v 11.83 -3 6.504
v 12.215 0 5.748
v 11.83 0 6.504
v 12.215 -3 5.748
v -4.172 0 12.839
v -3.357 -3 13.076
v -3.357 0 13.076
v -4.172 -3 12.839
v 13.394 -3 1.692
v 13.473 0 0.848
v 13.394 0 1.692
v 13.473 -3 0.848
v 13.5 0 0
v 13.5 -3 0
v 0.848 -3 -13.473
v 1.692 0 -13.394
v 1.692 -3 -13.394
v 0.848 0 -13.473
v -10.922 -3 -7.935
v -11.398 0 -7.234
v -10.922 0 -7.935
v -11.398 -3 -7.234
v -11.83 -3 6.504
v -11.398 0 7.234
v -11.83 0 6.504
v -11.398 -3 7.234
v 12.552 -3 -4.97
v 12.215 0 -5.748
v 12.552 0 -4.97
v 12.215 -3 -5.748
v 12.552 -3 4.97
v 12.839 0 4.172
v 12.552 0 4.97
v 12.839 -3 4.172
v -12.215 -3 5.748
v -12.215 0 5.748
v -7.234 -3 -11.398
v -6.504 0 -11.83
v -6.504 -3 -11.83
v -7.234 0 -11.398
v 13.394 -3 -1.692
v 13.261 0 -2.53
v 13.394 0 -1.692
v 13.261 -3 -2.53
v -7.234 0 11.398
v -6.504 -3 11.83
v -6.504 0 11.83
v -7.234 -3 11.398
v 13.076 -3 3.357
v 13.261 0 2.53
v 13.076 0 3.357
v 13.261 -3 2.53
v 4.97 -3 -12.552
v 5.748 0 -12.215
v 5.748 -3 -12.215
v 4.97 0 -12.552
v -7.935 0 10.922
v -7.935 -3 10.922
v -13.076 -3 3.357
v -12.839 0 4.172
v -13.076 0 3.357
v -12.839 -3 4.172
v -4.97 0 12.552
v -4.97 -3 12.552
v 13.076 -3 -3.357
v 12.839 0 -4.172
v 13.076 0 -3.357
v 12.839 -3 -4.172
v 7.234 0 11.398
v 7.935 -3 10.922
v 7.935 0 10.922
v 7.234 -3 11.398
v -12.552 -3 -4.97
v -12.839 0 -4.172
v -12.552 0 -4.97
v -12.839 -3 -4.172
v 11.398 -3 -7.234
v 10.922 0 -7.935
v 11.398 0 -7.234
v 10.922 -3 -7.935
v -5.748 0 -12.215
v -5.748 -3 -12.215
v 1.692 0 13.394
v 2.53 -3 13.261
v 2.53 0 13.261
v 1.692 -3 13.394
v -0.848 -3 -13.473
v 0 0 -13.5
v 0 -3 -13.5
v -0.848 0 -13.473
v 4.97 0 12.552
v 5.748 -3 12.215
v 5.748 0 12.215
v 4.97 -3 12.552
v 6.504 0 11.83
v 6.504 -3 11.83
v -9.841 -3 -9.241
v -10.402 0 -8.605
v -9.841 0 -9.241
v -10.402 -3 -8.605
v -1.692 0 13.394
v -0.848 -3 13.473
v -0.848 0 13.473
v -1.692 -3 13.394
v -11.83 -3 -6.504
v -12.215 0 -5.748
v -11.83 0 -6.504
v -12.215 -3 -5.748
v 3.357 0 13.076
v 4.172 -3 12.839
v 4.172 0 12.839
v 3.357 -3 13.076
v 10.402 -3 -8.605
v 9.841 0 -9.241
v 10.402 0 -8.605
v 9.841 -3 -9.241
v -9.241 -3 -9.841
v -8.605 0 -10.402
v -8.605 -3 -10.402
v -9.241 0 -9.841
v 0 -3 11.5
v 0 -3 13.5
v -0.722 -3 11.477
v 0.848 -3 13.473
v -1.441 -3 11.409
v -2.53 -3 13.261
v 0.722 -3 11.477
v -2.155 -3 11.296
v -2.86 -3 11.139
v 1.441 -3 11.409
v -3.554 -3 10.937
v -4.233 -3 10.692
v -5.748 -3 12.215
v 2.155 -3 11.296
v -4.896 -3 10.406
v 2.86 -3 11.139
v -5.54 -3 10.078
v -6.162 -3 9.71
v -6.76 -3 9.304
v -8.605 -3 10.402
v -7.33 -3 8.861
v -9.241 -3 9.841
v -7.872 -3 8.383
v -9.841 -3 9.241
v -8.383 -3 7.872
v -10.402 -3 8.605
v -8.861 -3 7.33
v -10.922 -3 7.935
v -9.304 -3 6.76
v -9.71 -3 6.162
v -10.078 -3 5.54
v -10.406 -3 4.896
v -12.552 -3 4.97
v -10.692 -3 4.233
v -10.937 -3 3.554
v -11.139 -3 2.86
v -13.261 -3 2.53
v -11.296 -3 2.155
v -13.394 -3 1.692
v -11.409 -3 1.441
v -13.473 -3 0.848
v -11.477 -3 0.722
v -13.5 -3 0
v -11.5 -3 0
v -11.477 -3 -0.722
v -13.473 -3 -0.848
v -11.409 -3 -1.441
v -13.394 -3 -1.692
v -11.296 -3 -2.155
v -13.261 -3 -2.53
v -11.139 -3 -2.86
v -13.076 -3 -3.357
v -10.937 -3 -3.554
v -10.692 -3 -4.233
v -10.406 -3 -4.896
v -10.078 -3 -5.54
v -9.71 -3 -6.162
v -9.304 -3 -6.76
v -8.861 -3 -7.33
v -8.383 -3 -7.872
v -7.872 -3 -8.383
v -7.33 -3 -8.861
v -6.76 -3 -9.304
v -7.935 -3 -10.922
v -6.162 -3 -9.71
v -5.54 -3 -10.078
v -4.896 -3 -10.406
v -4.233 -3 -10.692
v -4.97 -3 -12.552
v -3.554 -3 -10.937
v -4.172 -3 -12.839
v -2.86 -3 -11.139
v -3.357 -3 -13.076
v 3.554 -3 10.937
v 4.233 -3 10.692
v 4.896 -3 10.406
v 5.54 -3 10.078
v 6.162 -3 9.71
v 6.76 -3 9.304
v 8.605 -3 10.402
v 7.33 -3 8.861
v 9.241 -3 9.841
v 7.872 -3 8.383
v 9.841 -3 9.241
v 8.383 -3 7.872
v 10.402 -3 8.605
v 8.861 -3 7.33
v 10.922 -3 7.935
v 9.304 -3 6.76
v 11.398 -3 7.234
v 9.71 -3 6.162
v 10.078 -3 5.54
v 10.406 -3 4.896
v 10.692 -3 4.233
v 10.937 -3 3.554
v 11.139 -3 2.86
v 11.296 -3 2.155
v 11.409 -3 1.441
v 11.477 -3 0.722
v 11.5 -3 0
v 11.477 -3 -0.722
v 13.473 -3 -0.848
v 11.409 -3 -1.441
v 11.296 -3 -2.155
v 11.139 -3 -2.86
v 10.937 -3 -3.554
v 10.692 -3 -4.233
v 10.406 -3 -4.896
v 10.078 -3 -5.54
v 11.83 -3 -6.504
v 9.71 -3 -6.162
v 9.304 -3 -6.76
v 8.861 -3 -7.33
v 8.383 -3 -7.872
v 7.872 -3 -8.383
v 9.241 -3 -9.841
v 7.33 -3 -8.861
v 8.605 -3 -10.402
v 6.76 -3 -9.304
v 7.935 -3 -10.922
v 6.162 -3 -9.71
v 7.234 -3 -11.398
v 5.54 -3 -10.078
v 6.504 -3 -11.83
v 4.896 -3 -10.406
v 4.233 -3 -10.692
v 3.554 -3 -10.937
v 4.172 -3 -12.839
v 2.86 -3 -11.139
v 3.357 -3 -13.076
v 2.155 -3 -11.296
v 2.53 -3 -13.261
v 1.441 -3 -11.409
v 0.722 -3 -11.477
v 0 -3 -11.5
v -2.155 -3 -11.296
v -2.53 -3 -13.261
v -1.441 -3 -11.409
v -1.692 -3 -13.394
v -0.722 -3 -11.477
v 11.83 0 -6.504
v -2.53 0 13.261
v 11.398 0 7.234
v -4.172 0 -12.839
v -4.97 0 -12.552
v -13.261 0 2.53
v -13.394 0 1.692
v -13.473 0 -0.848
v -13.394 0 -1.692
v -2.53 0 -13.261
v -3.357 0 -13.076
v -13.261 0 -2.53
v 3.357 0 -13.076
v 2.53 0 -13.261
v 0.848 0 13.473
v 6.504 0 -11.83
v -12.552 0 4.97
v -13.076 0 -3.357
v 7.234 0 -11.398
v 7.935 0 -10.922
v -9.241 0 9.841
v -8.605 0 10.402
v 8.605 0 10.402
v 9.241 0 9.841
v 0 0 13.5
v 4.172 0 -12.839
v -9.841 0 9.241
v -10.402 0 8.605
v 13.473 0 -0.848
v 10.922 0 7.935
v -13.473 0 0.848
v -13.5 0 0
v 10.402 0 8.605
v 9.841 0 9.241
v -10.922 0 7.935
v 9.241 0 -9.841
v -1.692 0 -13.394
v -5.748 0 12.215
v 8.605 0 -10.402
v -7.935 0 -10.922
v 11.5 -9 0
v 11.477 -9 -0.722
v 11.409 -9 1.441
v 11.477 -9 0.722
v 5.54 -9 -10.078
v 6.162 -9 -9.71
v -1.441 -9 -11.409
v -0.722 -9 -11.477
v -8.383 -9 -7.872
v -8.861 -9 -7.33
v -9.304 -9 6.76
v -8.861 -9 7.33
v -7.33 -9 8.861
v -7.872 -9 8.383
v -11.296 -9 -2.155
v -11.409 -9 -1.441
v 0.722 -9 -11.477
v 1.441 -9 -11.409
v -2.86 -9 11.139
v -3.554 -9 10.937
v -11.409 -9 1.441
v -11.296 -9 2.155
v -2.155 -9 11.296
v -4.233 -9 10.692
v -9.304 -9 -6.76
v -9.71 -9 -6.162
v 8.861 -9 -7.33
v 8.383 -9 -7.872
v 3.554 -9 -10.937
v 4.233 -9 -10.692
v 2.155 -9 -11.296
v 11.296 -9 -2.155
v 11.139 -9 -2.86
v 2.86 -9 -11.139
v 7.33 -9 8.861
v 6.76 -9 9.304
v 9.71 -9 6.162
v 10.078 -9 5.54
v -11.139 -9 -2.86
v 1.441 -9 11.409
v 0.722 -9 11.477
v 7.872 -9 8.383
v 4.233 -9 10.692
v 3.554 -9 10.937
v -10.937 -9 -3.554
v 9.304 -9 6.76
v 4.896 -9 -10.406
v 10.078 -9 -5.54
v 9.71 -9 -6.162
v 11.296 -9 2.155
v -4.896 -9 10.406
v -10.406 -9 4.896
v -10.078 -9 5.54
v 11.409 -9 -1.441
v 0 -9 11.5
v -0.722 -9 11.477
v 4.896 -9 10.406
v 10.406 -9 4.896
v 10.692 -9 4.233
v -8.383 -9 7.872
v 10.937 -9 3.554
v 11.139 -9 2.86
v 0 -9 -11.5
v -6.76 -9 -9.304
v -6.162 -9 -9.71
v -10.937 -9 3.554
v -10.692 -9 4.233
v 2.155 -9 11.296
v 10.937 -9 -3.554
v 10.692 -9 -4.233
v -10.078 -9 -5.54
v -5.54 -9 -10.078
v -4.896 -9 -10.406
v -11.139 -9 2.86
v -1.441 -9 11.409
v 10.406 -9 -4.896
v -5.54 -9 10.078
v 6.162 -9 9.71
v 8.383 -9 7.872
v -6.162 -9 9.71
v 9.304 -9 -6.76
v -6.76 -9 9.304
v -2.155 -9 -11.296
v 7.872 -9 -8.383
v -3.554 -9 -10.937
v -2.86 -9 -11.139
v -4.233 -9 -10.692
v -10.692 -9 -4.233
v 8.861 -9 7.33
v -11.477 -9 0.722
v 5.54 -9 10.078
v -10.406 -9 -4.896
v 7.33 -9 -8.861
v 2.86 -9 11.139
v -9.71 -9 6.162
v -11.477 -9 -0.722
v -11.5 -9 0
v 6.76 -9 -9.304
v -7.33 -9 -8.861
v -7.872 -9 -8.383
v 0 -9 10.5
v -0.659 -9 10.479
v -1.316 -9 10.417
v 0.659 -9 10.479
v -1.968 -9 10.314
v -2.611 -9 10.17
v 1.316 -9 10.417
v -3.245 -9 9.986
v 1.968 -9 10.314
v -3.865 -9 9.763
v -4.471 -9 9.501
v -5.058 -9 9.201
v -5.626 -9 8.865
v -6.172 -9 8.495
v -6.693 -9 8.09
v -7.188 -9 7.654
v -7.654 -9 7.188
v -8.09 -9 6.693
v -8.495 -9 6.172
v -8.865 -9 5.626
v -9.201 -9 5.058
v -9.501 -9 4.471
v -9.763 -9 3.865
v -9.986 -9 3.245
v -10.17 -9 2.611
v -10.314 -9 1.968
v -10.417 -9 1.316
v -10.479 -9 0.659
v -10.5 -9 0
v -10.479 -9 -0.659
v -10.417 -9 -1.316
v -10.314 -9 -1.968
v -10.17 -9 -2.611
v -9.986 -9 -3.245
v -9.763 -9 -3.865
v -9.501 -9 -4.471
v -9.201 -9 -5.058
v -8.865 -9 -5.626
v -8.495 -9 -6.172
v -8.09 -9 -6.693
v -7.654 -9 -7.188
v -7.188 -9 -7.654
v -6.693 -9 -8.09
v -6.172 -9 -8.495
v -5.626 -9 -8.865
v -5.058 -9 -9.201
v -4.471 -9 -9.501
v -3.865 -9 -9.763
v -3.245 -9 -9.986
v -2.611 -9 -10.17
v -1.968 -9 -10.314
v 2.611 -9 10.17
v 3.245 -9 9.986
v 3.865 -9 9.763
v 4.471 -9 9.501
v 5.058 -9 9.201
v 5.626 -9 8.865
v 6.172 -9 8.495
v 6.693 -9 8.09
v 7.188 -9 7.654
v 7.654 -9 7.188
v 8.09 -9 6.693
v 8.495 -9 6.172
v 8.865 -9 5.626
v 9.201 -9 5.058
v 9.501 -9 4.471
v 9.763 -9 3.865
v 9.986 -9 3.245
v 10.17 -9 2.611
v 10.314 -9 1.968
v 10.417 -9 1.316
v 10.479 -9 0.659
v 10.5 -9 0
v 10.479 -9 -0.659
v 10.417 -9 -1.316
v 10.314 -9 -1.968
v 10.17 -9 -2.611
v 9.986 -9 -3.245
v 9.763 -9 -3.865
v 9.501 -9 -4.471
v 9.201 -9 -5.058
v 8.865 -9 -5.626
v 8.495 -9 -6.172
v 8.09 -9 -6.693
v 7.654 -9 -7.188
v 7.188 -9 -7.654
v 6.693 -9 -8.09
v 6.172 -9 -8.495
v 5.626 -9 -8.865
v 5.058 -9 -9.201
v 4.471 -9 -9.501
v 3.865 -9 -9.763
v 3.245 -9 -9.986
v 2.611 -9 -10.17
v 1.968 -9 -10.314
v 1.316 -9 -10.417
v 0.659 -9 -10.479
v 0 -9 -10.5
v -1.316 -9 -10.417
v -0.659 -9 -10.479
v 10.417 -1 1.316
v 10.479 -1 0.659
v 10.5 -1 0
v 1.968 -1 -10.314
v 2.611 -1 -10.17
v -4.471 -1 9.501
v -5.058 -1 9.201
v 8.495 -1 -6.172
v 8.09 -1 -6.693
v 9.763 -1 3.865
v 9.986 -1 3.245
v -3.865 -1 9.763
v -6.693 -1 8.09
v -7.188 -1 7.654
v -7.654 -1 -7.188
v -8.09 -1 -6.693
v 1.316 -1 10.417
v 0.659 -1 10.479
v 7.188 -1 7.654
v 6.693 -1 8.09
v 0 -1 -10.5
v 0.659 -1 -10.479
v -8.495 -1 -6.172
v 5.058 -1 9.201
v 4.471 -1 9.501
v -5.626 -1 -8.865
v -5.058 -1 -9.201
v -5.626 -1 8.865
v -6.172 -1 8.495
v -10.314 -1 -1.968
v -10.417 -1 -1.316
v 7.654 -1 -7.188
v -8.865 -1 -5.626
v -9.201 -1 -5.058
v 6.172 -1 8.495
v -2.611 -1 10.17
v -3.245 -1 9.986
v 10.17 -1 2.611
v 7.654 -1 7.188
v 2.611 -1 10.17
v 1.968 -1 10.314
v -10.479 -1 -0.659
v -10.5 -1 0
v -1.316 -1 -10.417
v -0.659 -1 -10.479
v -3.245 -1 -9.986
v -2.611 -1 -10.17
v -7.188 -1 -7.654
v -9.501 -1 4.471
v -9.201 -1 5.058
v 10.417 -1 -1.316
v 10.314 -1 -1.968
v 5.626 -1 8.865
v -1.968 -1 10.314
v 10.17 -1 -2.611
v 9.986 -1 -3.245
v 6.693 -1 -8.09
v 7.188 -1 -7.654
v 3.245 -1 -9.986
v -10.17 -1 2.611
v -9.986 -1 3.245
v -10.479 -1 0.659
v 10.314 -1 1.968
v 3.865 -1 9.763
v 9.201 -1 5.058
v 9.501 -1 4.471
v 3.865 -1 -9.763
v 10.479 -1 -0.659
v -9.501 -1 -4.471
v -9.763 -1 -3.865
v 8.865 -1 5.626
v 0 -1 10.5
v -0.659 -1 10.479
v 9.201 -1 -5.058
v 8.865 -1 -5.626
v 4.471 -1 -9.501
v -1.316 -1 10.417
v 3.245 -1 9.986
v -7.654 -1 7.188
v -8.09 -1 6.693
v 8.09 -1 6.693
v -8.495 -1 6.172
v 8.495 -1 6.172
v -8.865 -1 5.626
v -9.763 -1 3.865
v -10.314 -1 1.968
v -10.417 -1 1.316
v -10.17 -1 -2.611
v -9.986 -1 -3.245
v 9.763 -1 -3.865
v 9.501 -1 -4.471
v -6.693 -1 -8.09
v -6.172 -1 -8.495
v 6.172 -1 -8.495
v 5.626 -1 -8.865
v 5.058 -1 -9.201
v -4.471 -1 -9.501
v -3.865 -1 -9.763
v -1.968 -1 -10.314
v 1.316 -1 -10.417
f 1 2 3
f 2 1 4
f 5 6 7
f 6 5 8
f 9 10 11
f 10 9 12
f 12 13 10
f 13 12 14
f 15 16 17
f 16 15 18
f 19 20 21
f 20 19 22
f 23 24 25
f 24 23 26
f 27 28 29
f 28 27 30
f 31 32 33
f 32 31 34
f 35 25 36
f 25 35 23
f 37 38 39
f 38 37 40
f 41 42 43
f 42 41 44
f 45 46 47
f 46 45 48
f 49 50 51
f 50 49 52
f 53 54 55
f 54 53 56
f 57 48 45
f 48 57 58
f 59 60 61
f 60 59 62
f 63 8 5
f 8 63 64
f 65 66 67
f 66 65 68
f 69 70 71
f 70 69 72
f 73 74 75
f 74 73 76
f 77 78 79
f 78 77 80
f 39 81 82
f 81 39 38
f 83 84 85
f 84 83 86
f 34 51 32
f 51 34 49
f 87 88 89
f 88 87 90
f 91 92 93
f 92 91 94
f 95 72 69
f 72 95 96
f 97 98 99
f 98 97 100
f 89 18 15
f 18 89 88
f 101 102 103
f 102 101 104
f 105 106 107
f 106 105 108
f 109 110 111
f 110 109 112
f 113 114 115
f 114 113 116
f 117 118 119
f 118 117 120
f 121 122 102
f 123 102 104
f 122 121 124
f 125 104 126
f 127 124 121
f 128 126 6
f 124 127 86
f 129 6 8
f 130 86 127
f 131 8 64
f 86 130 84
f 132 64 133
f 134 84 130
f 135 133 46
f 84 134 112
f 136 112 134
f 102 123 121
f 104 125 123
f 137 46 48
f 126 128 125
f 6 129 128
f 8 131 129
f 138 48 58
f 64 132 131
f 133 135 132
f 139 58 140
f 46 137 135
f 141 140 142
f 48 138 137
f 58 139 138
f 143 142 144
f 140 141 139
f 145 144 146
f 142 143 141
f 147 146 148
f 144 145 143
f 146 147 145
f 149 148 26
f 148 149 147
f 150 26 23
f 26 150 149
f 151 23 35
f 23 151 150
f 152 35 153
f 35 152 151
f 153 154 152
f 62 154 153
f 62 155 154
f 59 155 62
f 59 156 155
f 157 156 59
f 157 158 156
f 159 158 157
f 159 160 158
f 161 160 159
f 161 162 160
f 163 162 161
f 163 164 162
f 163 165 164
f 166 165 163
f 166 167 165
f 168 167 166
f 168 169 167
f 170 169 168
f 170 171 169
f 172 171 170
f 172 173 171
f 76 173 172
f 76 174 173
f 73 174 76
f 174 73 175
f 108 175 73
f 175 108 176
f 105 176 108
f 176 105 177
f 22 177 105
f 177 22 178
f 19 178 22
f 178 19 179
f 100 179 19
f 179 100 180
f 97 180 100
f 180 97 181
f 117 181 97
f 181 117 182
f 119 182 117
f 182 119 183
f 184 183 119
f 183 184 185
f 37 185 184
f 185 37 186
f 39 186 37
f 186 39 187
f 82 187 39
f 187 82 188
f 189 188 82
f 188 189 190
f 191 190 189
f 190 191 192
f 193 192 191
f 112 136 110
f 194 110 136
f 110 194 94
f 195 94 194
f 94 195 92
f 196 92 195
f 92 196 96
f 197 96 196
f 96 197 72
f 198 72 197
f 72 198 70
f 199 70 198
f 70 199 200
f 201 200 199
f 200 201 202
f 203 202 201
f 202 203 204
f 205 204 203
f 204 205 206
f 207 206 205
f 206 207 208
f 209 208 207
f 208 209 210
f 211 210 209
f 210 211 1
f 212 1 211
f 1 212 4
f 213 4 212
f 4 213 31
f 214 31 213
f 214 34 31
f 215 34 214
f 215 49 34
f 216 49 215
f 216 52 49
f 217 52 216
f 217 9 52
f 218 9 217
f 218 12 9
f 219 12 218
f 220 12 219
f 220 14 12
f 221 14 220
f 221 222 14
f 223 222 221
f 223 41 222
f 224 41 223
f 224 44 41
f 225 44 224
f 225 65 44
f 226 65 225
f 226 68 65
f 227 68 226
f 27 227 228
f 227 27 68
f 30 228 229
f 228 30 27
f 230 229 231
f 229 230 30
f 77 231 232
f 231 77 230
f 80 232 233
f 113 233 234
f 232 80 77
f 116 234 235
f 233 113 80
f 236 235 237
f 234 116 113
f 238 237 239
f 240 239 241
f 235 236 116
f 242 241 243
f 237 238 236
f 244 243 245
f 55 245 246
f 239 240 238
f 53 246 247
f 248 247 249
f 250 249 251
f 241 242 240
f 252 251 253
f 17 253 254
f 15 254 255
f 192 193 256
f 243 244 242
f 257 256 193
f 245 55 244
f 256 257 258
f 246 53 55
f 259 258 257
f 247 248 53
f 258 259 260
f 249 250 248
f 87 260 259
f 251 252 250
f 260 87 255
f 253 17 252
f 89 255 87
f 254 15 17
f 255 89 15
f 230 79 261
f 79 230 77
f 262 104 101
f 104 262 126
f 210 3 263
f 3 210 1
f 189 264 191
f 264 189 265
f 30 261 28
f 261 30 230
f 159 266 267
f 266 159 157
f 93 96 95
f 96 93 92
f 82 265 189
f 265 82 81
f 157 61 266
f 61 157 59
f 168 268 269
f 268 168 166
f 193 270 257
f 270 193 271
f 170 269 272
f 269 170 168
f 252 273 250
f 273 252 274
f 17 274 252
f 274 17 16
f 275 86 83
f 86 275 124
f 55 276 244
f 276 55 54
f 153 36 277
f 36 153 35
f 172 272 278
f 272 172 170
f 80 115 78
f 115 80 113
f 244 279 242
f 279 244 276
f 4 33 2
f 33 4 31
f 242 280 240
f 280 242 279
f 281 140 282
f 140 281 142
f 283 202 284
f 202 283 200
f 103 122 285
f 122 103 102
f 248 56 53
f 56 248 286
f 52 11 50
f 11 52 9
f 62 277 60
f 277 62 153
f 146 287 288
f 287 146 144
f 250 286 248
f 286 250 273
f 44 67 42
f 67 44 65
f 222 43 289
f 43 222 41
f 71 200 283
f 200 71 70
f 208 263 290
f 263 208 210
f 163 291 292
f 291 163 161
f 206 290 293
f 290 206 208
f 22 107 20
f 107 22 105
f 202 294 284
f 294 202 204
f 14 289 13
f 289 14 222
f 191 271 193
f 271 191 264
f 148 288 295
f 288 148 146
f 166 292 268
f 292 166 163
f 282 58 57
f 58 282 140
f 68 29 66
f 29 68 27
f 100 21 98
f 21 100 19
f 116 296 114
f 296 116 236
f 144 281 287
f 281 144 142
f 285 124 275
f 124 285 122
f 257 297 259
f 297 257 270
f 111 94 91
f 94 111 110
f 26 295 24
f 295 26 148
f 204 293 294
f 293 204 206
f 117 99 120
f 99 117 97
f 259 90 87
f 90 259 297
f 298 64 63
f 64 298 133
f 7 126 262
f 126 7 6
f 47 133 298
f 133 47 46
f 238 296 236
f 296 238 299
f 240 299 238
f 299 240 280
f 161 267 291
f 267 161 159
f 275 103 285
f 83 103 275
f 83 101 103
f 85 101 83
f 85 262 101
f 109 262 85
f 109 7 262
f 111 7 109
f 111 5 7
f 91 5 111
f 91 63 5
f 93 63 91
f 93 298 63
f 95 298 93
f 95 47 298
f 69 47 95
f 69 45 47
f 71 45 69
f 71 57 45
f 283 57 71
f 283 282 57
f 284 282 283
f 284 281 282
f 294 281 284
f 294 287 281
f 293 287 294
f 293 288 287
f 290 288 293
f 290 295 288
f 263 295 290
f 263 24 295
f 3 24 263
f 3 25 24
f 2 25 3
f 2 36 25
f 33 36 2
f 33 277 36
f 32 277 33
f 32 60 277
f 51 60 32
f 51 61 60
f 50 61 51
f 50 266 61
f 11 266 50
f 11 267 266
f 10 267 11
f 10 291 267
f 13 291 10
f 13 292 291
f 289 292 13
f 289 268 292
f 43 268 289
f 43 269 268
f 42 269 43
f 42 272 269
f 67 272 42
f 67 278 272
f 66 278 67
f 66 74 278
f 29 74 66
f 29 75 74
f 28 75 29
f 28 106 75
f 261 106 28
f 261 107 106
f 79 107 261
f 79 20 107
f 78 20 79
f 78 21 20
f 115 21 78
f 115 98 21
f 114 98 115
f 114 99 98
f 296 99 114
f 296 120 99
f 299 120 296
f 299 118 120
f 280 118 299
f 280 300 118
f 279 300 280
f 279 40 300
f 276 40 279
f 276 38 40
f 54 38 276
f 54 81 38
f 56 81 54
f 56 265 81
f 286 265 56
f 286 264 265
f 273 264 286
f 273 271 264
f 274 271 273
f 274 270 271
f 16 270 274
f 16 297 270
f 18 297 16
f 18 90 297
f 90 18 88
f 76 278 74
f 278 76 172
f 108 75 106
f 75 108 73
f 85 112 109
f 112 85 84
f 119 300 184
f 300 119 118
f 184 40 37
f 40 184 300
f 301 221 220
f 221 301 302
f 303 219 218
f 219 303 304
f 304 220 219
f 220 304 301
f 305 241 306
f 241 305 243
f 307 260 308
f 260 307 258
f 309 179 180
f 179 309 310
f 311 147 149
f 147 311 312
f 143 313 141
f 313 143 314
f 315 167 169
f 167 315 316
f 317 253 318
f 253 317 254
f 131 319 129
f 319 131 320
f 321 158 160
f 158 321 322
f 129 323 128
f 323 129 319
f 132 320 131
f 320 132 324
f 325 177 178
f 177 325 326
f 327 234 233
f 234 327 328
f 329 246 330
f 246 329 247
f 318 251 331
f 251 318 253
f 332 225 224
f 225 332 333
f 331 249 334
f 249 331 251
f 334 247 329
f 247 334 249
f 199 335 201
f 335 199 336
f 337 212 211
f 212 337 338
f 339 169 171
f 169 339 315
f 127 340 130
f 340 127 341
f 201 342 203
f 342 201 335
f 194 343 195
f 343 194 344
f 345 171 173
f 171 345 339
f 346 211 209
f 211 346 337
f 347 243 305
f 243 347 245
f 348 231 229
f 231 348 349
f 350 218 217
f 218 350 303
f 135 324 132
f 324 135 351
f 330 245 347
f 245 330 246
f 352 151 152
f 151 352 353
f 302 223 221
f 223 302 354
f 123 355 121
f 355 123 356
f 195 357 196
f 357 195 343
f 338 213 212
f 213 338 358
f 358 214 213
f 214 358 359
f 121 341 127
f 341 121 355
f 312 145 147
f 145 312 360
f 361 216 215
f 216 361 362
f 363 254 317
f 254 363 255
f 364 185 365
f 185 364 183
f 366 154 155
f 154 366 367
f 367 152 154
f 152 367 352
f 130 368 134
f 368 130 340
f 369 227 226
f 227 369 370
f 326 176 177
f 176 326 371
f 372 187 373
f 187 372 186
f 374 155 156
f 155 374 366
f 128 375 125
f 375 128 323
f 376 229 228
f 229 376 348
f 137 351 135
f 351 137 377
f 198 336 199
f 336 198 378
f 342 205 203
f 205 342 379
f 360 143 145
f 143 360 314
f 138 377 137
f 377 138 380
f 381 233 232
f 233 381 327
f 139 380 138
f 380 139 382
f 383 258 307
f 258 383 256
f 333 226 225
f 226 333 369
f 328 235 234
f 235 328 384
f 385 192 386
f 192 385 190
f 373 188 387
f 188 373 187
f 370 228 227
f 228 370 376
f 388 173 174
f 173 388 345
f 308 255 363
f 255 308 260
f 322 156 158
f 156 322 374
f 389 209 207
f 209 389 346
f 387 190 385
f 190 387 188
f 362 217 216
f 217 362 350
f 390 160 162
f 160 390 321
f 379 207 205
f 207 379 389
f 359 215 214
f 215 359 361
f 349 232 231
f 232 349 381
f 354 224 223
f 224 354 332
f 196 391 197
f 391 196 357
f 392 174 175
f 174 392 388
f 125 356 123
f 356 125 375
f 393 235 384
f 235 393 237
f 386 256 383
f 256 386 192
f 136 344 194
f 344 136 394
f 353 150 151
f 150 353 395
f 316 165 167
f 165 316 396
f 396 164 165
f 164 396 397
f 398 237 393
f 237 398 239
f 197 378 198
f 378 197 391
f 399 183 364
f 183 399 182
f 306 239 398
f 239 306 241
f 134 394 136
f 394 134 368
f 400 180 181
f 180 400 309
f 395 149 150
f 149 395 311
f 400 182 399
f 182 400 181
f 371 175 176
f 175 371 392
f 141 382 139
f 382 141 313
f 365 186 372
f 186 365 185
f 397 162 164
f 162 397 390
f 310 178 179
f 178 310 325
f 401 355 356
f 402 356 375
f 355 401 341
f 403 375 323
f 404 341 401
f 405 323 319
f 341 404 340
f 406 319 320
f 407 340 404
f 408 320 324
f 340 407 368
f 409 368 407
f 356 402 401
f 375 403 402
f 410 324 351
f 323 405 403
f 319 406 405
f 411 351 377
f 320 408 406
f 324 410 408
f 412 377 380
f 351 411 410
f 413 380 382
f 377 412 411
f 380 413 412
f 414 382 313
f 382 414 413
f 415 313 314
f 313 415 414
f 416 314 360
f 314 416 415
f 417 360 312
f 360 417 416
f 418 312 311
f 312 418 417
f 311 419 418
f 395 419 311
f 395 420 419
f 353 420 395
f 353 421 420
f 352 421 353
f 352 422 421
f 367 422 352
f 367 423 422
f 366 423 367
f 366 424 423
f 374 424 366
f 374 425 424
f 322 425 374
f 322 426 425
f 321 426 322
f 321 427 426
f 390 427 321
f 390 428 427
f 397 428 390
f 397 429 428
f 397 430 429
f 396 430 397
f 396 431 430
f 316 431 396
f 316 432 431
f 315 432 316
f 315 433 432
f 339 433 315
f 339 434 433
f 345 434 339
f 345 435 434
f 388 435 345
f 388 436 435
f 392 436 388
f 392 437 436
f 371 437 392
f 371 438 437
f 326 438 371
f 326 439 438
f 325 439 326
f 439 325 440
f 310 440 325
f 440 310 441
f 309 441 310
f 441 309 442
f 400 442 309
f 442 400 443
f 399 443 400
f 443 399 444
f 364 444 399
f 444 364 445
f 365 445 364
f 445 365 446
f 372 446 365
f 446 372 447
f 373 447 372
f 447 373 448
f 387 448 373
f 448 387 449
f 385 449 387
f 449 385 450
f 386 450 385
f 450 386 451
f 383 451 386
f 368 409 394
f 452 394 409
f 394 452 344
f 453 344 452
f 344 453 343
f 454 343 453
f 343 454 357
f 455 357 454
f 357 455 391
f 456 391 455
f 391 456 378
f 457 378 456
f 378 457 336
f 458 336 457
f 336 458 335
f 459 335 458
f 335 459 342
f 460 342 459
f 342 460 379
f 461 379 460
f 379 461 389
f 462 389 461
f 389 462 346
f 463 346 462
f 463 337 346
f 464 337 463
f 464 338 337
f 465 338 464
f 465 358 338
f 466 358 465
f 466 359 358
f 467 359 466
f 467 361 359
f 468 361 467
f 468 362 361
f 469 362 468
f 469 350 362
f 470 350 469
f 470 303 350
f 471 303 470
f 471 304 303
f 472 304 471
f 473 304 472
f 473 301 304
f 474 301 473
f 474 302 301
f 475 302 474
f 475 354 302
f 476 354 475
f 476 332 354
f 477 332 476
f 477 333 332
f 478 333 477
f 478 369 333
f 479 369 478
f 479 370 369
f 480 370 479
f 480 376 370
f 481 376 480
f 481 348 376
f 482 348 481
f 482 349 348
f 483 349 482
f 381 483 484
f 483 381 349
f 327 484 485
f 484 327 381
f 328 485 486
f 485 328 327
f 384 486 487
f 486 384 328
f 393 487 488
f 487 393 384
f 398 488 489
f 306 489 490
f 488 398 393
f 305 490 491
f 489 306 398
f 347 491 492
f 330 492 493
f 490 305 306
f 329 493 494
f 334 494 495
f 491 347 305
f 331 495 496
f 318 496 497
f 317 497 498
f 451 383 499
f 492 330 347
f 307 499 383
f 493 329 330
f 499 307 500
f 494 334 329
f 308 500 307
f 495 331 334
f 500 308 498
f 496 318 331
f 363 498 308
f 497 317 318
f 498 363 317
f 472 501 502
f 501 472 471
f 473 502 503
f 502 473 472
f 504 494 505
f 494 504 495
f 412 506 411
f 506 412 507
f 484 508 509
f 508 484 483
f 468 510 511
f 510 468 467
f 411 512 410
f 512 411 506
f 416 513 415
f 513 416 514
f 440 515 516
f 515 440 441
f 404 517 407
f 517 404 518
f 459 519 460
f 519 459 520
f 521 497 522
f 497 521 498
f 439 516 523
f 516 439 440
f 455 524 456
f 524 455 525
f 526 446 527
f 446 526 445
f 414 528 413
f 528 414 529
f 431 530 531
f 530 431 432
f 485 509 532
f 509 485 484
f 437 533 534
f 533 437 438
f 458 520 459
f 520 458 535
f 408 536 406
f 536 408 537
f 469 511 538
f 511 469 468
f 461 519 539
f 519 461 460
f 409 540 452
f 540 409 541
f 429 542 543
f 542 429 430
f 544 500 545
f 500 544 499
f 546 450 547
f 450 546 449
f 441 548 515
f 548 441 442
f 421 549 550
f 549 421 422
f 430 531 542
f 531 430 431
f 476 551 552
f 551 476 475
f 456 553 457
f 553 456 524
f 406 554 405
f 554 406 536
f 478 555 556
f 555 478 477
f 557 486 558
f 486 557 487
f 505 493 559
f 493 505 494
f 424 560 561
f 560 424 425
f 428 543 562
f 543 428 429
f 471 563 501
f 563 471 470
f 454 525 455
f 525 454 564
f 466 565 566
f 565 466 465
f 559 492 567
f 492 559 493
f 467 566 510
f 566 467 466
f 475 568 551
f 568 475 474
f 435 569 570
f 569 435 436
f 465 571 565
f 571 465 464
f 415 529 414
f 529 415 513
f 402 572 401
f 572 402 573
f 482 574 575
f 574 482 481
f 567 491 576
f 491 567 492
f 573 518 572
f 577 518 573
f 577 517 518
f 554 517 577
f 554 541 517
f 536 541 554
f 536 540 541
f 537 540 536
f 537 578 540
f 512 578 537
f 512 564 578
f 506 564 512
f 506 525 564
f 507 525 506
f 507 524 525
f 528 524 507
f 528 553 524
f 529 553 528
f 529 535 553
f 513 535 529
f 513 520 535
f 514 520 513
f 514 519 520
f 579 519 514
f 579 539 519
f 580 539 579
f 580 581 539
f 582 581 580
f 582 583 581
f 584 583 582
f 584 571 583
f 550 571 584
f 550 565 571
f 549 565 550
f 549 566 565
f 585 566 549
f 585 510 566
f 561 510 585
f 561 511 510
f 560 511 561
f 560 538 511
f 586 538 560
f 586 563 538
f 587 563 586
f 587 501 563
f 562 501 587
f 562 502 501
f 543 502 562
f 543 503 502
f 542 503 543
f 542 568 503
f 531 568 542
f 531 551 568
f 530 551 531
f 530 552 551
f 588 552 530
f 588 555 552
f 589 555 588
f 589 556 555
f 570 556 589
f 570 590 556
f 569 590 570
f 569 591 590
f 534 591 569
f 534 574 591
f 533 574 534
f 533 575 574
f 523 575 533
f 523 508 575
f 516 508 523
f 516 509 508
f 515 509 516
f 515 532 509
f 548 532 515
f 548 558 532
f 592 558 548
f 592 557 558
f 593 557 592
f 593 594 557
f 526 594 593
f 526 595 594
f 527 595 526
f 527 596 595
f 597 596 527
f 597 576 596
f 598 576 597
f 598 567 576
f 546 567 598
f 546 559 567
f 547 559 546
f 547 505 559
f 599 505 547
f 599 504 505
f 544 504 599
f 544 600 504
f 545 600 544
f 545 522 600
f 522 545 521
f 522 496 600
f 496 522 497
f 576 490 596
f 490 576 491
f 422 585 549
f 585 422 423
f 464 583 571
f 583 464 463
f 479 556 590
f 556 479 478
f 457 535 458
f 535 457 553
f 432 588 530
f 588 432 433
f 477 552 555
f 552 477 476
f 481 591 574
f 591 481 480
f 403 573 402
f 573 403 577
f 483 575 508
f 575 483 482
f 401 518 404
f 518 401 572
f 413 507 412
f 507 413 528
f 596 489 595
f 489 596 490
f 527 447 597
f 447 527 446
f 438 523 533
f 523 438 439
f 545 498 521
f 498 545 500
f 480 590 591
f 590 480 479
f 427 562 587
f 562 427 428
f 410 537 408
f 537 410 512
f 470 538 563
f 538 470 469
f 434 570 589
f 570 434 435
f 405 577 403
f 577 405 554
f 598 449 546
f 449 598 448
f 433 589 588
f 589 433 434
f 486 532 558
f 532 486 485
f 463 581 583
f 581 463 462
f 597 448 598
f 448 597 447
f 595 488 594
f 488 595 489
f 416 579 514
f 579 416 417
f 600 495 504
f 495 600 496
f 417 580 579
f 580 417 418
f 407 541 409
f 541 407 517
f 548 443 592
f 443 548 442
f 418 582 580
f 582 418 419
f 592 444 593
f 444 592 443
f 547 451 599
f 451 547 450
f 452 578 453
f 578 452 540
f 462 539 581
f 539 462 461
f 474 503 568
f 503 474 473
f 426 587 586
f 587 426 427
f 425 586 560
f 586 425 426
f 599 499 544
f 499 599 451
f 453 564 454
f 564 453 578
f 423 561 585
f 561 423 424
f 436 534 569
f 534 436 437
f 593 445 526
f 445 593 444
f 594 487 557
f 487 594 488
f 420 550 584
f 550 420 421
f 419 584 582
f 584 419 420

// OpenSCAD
difference(){
	union(){


        difference(){
            union(){
                

                translate([0,0,0]){
                    rotate([90,0,0]){
                        cylinder(h=3, r=27/2, $fn=100, center=false);
                    }
                }       

                translate([0,0,0]){
                    rotate([90,0,0]){
                        cylinder(h=9, r=23/2, $fn=100, center=false);
                    }
                }       
            }
            union() {

                translate([0,-1,0]){
                    rotate([90,0,0]){
                        cylinder(h=12, r=21/2, $fn=100, center=false);
                    }
                }       




           

            }
        }


            }
            union() {


           

            }
        }
